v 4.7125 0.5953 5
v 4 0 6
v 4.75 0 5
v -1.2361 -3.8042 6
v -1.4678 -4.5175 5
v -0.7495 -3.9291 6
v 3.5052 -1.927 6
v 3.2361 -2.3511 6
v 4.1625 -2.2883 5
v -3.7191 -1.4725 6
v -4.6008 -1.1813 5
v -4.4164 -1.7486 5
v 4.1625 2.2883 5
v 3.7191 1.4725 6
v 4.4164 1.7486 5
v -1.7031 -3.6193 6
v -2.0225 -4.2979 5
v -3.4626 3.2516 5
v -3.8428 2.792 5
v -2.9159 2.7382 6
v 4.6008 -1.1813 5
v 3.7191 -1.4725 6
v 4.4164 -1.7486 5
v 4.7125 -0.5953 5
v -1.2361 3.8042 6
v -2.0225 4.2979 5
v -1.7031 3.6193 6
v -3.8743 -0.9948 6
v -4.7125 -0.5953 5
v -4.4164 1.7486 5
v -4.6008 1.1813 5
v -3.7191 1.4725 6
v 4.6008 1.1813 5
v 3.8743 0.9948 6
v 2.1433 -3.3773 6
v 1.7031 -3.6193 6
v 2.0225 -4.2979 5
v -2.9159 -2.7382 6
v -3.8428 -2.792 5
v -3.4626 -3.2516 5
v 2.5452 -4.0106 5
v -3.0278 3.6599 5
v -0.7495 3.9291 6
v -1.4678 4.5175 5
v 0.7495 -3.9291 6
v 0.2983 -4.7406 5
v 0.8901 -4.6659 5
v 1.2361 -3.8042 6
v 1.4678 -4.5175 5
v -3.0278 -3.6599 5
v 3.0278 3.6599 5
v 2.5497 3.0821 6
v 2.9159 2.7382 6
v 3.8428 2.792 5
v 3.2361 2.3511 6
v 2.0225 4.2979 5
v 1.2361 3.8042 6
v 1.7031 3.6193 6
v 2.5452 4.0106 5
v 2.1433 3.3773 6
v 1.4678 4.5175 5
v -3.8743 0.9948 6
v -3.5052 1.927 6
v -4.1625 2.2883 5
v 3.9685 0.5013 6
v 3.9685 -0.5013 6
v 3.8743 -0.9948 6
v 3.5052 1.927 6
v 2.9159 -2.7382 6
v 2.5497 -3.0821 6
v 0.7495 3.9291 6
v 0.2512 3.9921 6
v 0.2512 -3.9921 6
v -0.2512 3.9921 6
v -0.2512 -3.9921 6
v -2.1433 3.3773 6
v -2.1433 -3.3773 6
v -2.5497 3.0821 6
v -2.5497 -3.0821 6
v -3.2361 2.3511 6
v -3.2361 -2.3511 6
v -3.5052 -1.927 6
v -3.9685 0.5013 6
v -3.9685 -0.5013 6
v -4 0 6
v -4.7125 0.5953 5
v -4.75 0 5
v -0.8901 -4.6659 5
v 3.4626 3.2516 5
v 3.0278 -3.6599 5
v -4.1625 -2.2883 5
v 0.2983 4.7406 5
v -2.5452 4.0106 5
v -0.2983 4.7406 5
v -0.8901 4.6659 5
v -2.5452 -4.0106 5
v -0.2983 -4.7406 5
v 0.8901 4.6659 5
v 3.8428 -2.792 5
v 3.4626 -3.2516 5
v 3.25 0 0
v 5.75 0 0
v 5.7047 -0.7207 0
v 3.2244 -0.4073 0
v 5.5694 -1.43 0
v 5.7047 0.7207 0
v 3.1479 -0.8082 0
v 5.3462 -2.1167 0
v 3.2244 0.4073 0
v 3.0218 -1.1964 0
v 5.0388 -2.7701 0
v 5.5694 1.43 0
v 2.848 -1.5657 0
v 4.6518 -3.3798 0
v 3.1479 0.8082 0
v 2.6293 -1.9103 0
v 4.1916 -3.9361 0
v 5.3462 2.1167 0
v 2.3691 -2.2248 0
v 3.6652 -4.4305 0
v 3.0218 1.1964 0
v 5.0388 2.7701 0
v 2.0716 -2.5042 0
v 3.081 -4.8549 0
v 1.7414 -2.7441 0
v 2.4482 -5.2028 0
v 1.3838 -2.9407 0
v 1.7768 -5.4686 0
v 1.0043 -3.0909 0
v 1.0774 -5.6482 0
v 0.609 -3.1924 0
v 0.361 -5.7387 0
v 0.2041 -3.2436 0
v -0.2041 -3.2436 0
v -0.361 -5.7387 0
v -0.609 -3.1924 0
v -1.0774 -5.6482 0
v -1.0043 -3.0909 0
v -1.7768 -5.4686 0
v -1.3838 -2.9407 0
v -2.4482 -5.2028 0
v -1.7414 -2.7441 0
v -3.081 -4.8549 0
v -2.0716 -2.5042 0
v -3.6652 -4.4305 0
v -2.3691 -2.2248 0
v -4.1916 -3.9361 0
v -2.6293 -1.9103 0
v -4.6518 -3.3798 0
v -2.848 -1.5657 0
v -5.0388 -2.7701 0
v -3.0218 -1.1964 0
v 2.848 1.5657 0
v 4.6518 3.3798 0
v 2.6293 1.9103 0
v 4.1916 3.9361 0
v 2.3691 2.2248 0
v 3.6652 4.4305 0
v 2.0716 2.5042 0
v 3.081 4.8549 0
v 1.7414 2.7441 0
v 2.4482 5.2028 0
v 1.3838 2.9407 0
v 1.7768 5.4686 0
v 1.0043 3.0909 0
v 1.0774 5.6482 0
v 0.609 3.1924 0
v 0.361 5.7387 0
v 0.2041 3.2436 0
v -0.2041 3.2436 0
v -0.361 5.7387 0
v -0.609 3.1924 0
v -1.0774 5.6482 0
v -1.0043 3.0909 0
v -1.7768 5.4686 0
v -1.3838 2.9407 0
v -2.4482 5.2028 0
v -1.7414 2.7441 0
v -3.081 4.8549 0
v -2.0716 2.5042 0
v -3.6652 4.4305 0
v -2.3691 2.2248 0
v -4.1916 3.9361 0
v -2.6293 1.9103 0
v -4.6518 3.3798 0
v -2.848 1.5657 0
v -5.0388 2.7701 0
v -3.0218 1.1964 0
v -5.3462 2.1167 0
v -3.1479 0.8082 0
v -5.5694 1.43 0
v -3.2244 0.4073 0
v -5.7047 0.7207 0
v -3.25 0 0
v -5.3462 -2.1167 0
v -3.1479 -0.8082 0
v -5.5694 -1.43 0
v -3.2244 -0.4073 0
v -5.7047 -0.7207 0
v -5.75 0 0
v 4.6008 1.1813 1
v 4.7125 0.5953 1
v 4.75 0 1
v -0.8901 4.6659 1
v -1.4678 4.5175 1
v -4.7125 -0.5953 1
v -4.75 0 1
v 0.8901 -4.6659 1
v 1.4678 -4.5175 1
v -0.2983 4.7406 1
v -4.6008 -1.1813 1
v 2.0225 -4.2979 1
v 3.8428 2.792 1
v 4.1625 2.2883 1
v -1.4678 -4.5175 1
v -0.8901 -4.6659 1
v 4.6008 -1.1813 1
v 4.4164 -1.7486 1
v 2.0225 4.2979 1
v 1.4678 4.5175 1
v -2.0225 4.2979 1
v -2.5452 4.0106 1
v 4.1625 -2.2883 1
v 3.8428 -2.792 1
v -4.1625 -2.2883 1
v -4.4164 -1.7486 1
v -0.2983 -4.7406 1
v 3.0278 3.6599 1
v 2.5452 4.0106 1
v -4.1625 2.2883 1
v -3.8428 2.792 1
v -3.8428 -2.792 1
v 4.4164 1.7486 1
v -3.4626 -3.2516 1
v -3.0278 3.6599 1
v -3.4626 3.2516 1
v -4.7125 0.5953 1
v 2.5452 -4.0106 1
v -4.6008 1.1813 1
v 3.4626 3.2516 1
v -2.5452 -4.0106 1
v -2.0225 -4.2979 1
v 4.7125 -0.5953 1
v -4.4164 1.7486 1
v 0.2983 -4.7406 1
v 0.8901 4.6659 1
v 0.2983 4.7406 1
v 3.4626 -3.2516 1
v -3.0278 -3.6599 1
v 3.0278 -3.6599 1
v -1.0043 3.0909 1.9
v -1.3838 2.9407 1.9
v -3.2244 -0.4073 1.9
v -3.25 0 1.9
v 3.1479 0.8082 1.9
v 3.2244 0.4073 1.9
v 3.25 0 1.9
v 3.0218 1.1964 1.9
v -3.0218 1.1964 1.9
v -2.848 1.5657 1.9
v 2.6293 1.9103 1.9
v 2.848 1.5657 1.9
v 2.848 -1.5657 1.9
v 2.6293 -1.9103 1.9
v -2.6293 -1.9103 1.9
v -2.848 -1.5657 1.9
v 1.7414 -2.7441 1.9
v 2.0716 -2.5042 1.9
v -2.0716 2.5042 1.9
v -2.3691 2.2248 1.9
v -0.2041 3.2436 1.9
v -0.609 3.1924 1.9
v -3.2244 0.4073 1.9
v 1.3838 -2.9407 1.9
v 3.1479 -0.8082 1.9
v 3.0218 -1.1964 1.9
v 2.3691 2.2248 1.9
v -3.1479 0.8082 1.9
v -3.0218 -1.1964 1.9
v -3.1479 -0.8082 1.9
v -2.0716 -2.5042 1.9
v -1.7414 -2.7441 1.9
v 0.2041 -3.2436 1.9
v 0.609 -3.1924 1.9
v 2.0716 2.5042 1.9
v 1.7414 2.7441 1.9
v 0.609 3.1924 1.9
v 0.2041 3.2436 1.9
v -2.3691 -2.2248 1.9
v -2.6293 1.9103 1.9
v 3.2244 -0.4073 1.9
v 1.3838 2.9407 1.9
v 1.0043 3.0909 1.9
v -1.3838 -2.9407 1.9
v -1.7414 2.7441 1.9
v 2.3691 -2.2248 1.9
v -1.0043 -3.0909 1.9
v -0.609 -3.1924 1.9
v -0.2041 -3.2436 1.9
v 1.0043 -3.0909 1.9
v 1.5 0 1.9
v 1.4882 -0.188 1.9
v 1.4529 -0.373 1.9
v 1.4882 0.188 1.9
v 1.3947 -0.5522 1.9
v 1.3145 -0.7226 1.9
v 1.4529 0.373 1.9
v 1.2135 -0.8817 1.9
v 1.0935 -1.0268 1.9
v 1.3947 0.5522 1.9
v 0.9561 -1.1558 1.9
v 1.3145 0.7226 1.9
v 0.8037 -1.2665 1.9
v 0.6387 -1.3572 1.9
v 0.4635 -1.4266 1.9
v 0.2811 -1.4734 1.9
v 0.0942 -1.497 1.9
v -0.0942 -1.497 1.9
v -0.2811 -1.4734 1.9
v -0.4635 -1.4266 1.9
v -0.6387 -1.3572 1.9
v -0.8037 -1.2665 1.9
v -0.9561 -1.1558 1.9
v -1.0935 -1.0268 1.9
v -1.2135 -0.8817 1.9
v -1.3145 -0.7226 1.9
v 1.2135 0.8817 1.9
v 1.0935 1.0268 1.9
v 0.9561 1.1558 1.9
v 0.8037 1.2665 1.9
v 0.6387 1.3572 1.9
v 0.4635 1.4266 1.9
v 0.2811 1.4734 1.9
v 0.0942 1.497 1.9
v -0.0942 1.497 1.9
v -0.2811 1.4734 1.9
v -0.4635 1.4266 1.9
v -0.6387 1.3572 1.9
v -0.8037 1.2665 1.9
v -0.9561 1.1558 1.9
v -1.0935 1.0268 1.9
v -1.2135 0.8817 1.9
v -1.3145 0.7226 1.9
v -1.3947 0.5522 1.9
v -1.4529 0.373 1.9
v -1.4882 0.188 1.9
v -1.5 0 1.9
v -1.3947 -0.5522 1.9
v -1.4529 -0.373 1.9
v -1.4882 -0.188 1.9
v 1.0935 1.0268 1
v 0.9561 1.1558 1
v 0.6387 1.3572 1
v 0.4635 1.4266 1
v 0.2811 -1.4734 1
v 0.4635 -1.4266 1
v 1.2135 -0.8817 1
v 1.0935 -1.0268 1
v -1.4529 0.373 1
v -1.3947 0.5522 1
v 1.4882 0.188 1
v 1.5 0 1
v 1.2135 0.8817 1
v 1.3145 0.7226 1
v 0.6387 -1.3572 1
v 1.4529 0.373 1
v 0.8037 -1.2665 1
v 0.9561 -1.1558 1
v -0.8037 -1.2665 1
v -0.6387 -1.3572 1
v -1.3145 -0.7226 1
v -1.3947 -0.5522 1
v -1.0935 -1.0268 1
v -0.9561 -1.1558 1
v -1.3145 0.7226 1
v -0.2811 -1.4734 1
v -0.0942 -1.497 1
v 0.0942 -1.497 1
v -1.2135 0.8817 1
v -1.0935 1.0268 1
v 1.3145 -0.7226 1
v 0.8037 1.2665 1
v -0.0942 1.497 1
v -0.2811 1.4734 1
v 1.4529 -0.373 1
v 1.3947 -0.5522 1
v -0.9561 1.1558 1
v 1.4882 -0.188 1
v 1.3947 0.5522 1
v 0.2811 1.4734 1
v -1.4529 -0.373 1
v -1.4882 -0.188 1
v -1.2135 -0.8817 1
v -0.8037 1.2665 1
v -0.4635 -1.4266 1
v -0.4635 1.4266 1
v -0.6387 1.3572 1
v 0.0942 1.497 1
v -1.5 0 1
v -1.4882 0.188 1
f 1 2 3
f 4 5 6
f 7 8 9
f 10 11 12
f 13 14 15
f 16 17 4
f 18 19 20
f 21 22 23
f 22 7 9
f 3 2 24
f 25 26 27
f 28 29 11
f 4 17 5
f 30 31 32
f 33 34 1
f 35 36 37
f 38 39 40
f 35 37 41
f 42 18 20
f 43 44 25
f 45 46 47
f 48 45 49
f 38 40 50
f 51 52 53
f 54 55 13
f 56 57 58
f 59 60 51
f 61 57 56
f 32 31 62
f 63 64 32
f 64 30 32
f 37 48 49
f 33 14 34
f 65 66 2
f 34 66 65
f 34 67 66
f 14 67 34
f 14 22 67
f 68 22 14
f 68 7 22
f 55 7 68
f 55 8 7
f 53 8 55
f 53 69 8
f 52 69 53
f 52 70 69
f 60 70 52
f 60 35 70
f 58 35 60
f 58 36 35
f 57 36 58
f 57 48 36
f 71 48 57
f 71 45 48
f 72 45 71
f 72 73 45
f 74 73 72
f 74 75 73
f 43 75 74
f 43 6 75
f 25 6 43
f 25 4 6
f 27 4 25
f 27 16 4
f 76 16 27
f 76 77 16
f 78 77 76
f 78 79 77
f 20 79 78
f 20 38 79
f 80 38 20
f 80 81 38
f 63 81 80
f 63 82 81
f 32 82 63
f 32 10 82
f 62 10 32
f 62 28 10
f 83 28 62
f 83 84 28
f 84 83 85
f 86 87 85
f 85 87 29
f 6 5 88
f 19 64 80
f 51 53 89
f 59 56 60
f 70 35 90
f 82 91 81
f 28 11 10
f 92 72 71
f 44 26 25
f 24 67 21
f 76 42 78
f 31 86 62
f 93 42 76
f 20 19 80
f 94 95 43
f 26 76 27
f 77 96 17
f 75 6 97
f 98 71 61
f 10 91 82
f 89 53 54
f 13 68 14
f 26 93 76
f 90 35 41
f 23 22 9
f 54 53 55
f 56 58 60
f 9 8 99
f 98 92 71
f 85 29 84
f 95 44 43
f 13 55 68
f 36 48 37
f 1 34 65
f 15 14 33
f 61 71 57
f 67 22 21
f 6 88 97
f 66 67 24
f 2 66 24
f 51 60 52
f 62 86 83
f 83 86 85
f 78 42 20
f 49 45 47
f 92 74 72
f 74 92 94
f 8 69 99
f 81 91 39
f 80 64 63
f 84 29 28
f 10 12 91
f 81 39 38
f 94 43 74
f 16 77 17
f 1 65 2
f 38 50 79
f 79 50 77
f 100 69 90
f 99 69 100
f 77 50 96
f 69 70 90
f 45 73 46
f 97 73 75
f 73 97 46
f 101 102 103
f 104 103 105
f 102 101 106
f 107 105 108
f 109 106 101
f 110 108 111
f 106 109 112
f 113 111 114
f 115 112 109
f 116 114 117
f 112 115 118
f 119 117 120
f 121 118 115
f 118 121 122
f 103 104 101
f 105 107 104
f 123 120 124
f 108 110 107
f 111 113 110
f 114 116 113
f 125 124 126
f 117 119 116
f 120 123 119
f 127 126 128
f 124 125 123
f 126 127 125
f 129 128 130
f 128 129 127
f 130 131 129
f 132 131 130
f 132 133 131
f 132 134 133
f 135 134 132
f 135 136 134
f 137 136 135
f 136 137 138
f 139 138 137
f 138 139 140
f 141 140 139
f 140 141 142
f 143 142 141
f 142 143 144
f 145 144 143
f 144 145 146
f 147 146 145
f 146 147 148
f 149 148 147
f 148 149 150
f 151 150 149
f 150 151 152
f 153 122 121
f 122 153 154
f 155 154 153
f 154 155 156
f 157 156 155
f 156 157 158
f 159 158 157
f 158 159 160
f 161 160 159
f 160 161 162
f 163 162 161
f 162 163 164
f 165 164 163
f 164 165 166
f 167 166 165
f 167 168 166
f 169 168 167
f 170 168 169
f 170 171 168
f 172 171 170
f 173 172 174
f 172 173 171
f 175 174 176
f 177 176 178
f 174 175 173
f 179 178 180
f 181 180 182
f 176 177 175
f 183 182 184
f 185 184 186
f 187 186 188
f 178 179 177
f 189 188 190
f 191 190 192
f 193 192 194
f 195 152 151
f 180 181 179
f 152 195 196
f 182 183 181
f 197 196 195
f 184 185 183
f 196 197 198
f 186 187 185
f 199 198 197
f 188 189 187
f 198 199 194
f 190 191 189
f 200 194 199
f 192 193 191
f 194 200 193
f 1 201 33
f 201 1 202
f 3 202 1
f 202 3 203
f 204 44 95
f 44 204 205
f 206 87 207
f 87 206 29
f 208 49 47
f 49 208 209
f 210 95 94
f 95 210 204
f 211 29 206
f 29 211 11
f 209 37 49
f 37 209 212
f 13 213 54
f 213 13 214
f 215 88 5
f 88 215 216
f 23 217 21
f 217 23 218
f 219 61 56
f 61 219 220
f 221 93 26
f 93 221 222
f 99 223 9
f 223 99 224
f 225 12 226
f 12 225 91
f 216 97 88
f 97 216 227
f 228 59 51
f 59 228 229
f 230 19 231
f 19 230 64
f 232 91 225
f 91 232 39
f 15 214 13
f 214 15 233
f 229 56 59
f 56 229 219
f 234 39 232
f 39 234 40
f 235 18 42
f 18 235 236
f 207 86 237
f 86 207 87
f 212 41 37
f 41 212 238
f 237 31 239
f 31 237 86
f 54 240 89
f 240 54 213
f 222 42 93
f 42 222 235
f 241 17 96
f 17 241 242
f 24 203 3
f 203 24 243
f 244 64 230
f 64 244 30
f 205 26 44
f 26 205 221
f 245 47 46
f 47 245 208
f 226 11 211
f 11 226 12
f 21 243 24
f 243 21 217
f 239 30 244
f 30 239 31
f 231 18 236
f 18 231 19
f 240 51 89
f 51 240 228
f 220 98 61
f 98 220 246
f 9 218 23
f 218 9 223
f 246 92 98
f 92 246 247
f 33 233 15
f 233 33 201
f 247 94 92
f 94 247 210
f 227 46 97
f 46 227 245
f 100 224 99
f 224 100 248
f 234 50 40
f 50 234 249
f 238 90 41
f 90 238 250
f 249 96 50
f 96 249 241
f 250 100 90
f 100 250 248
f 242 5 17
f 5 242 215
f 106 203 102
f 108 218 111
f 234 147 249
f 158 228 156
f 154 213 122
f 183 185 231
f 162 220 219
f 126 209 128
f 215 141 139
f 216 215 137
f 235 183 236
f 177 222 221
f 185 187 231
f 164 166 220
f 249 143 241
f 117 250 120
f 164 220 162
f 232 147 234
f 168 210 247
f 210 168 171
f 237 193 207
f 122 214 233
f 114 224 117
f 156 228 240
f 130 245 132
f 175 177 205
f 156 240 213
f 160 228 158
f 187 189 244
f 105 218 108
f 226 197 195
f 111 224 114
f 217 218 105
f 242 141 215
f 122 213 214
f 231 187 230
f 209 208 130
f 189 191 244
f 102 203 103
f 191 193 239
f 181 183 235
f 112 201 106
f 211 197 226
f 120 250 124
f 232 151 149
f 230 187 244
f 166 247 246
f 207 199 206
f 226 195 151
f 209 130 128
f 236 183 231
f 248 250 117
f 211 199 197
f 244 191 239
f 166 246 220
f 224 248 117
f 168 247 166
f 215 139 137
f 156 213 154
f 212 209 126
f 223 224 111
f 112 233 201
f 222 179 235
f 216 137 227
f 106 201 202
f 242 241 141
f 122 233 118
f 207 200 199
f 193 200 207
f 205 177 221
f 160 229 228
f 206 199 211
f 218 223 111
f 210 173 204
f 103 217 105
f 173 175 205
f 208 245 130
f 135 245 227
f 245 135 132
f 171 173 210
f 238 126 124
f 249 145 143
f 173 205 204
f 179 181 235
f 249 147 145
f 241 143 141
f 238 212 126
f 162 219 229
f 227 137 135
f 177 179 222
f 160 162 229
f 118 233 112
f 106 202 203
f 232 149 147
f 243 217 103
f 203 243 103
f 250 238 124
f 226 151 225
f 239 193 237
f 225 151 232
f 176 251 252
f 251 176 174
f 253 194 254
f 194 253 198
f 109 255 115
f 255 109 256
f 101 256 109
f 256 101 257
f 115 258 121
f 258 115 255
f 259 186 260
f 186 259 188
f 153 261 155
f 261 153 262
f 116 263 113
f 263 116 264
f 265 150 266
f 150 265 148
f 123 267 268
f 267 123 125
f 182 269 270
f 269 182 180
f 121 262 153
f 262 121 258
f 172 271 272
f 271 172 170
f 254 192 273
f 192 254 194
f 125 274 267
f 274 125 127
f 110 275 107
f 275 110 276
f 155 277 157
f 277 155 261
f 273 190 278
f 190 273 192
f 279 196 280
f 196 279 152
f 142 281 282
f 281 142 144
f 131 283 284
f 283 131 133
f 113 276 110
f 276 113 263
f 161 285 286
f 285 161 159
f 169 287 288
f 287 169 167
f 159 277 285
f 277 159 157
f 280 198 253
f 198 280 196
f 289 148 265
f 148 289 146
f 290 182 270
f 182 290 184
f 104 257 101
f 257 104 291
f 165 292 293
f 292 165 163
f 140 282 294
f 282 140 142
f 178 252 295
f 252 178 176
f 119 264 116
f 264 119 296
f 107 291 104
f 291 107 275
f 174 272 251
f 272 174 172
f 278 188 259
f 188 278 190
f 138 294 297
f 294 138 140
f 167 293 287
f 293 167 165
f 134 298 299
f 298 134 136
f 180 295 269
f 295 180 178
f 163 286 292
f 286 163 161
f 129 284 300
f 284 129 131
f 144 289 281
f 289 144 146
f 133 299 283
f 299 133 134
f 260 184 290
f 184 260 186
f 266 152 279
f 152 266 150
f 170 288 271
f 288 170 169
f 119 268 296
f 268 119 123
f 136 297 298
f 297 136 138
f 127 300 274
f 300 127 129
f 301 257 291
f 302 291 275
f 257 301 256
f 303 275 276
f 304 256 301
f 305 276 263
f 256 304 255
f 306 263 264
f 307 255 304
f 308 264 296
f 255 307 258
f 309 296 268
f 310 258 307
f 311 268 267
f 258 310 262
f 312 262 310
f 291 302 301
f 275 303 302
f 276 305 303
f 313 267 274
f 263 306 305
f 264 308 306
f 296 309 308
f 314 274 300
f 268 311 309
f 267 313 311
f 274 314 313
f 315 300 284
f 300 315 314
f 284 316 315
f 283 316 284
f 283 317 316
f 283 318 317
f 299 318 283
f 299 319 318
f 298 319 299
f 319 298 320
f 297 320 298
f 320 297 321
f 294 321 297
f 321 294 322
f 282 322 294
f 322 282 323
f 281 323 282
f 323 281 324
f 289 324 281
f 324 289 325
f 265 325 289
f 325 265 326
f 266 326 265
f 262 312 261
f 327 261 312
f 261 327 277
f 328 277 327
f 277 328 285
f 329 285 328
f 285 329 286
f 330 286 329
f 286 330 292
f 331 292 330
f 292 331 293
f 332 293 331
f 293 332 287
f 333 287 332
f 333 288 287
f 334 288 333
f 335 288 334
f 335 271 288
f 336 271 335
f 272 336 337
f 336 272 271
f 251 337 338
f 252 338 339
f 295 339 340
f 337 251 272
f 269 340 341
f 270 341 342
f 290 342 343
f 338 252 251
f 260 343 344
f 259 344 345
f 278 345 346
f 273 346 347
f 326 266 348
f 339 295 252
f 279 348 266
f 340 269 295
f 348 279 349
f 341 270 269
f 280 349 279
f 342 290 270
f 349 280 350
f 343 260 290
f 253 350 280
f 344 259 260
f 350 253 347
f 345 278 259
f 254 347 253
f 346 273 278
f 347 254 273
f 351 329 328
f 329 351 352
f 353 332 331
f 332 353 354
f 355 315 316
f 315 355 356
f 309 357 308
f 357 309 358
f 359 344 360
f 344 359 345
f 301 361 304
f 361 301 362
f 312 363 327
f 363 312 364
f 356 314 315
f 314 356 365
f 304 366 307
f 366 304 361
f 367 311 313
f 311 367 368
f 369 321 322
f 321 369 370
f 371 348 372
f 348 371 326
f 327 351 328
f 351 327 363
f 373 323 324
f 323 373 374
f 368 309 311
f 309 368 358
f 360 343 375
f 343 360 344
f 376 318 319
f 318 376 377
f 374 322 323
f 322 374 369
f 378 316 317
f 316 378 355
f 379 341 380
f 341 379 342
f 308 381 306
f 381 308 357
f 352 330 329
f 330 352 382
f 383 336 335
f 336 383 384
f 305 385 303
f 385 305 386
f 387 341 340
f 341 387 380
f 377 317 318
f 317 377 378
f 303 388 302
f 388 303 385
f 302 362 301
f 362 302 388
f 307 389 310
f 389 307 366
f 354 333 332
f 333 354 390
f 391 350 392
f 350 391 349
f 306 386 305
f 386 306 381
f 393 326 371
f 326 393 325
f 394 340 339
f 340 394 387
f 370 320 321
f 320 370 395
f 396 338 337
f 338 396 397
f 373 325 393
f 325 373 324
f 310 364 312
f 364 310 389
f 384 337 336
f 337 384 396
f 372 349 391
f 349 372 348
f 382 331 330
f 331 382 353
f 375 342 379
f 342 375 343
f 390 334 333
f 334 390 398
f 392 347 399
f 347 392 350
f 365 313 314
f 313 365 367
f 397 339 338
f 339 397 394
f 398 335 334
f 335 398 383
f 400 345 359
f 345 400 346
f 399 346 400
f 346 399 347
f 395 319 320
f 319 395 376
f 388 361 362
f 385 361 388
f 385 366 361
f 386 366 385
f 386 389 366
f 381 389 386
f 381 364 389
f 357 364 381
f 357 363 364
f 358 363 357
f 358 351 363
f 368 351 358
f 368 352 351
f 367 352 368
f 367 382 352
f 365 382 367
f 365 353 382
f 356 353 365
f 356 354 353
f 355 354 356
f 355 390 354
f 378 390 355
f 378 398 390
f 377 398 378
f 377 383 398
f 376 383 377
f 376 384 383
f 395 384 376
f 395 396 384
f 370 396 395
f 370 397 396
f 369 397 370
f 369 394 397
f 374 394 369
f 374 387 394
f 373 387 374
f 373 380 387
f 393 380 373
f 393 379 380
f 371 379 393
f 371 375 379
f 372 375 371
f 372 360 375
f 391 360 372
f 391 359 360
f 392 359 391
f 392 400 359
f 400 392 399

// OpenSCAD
$fn=50;
union() {
    difference() {
    union() {
        translate([0,0,5]) cylinder(1, r1=9.5/2, r2=4);
        cylinder(5, d=9.5);
        cylinder(1, r1=11.5/2, r2=9.5/2);
    }
    translate([0,0,-0.1]) cylinder(2, d=6.5);
  }
  translate([0,0,1]) cylinder(3,d=3);
}
